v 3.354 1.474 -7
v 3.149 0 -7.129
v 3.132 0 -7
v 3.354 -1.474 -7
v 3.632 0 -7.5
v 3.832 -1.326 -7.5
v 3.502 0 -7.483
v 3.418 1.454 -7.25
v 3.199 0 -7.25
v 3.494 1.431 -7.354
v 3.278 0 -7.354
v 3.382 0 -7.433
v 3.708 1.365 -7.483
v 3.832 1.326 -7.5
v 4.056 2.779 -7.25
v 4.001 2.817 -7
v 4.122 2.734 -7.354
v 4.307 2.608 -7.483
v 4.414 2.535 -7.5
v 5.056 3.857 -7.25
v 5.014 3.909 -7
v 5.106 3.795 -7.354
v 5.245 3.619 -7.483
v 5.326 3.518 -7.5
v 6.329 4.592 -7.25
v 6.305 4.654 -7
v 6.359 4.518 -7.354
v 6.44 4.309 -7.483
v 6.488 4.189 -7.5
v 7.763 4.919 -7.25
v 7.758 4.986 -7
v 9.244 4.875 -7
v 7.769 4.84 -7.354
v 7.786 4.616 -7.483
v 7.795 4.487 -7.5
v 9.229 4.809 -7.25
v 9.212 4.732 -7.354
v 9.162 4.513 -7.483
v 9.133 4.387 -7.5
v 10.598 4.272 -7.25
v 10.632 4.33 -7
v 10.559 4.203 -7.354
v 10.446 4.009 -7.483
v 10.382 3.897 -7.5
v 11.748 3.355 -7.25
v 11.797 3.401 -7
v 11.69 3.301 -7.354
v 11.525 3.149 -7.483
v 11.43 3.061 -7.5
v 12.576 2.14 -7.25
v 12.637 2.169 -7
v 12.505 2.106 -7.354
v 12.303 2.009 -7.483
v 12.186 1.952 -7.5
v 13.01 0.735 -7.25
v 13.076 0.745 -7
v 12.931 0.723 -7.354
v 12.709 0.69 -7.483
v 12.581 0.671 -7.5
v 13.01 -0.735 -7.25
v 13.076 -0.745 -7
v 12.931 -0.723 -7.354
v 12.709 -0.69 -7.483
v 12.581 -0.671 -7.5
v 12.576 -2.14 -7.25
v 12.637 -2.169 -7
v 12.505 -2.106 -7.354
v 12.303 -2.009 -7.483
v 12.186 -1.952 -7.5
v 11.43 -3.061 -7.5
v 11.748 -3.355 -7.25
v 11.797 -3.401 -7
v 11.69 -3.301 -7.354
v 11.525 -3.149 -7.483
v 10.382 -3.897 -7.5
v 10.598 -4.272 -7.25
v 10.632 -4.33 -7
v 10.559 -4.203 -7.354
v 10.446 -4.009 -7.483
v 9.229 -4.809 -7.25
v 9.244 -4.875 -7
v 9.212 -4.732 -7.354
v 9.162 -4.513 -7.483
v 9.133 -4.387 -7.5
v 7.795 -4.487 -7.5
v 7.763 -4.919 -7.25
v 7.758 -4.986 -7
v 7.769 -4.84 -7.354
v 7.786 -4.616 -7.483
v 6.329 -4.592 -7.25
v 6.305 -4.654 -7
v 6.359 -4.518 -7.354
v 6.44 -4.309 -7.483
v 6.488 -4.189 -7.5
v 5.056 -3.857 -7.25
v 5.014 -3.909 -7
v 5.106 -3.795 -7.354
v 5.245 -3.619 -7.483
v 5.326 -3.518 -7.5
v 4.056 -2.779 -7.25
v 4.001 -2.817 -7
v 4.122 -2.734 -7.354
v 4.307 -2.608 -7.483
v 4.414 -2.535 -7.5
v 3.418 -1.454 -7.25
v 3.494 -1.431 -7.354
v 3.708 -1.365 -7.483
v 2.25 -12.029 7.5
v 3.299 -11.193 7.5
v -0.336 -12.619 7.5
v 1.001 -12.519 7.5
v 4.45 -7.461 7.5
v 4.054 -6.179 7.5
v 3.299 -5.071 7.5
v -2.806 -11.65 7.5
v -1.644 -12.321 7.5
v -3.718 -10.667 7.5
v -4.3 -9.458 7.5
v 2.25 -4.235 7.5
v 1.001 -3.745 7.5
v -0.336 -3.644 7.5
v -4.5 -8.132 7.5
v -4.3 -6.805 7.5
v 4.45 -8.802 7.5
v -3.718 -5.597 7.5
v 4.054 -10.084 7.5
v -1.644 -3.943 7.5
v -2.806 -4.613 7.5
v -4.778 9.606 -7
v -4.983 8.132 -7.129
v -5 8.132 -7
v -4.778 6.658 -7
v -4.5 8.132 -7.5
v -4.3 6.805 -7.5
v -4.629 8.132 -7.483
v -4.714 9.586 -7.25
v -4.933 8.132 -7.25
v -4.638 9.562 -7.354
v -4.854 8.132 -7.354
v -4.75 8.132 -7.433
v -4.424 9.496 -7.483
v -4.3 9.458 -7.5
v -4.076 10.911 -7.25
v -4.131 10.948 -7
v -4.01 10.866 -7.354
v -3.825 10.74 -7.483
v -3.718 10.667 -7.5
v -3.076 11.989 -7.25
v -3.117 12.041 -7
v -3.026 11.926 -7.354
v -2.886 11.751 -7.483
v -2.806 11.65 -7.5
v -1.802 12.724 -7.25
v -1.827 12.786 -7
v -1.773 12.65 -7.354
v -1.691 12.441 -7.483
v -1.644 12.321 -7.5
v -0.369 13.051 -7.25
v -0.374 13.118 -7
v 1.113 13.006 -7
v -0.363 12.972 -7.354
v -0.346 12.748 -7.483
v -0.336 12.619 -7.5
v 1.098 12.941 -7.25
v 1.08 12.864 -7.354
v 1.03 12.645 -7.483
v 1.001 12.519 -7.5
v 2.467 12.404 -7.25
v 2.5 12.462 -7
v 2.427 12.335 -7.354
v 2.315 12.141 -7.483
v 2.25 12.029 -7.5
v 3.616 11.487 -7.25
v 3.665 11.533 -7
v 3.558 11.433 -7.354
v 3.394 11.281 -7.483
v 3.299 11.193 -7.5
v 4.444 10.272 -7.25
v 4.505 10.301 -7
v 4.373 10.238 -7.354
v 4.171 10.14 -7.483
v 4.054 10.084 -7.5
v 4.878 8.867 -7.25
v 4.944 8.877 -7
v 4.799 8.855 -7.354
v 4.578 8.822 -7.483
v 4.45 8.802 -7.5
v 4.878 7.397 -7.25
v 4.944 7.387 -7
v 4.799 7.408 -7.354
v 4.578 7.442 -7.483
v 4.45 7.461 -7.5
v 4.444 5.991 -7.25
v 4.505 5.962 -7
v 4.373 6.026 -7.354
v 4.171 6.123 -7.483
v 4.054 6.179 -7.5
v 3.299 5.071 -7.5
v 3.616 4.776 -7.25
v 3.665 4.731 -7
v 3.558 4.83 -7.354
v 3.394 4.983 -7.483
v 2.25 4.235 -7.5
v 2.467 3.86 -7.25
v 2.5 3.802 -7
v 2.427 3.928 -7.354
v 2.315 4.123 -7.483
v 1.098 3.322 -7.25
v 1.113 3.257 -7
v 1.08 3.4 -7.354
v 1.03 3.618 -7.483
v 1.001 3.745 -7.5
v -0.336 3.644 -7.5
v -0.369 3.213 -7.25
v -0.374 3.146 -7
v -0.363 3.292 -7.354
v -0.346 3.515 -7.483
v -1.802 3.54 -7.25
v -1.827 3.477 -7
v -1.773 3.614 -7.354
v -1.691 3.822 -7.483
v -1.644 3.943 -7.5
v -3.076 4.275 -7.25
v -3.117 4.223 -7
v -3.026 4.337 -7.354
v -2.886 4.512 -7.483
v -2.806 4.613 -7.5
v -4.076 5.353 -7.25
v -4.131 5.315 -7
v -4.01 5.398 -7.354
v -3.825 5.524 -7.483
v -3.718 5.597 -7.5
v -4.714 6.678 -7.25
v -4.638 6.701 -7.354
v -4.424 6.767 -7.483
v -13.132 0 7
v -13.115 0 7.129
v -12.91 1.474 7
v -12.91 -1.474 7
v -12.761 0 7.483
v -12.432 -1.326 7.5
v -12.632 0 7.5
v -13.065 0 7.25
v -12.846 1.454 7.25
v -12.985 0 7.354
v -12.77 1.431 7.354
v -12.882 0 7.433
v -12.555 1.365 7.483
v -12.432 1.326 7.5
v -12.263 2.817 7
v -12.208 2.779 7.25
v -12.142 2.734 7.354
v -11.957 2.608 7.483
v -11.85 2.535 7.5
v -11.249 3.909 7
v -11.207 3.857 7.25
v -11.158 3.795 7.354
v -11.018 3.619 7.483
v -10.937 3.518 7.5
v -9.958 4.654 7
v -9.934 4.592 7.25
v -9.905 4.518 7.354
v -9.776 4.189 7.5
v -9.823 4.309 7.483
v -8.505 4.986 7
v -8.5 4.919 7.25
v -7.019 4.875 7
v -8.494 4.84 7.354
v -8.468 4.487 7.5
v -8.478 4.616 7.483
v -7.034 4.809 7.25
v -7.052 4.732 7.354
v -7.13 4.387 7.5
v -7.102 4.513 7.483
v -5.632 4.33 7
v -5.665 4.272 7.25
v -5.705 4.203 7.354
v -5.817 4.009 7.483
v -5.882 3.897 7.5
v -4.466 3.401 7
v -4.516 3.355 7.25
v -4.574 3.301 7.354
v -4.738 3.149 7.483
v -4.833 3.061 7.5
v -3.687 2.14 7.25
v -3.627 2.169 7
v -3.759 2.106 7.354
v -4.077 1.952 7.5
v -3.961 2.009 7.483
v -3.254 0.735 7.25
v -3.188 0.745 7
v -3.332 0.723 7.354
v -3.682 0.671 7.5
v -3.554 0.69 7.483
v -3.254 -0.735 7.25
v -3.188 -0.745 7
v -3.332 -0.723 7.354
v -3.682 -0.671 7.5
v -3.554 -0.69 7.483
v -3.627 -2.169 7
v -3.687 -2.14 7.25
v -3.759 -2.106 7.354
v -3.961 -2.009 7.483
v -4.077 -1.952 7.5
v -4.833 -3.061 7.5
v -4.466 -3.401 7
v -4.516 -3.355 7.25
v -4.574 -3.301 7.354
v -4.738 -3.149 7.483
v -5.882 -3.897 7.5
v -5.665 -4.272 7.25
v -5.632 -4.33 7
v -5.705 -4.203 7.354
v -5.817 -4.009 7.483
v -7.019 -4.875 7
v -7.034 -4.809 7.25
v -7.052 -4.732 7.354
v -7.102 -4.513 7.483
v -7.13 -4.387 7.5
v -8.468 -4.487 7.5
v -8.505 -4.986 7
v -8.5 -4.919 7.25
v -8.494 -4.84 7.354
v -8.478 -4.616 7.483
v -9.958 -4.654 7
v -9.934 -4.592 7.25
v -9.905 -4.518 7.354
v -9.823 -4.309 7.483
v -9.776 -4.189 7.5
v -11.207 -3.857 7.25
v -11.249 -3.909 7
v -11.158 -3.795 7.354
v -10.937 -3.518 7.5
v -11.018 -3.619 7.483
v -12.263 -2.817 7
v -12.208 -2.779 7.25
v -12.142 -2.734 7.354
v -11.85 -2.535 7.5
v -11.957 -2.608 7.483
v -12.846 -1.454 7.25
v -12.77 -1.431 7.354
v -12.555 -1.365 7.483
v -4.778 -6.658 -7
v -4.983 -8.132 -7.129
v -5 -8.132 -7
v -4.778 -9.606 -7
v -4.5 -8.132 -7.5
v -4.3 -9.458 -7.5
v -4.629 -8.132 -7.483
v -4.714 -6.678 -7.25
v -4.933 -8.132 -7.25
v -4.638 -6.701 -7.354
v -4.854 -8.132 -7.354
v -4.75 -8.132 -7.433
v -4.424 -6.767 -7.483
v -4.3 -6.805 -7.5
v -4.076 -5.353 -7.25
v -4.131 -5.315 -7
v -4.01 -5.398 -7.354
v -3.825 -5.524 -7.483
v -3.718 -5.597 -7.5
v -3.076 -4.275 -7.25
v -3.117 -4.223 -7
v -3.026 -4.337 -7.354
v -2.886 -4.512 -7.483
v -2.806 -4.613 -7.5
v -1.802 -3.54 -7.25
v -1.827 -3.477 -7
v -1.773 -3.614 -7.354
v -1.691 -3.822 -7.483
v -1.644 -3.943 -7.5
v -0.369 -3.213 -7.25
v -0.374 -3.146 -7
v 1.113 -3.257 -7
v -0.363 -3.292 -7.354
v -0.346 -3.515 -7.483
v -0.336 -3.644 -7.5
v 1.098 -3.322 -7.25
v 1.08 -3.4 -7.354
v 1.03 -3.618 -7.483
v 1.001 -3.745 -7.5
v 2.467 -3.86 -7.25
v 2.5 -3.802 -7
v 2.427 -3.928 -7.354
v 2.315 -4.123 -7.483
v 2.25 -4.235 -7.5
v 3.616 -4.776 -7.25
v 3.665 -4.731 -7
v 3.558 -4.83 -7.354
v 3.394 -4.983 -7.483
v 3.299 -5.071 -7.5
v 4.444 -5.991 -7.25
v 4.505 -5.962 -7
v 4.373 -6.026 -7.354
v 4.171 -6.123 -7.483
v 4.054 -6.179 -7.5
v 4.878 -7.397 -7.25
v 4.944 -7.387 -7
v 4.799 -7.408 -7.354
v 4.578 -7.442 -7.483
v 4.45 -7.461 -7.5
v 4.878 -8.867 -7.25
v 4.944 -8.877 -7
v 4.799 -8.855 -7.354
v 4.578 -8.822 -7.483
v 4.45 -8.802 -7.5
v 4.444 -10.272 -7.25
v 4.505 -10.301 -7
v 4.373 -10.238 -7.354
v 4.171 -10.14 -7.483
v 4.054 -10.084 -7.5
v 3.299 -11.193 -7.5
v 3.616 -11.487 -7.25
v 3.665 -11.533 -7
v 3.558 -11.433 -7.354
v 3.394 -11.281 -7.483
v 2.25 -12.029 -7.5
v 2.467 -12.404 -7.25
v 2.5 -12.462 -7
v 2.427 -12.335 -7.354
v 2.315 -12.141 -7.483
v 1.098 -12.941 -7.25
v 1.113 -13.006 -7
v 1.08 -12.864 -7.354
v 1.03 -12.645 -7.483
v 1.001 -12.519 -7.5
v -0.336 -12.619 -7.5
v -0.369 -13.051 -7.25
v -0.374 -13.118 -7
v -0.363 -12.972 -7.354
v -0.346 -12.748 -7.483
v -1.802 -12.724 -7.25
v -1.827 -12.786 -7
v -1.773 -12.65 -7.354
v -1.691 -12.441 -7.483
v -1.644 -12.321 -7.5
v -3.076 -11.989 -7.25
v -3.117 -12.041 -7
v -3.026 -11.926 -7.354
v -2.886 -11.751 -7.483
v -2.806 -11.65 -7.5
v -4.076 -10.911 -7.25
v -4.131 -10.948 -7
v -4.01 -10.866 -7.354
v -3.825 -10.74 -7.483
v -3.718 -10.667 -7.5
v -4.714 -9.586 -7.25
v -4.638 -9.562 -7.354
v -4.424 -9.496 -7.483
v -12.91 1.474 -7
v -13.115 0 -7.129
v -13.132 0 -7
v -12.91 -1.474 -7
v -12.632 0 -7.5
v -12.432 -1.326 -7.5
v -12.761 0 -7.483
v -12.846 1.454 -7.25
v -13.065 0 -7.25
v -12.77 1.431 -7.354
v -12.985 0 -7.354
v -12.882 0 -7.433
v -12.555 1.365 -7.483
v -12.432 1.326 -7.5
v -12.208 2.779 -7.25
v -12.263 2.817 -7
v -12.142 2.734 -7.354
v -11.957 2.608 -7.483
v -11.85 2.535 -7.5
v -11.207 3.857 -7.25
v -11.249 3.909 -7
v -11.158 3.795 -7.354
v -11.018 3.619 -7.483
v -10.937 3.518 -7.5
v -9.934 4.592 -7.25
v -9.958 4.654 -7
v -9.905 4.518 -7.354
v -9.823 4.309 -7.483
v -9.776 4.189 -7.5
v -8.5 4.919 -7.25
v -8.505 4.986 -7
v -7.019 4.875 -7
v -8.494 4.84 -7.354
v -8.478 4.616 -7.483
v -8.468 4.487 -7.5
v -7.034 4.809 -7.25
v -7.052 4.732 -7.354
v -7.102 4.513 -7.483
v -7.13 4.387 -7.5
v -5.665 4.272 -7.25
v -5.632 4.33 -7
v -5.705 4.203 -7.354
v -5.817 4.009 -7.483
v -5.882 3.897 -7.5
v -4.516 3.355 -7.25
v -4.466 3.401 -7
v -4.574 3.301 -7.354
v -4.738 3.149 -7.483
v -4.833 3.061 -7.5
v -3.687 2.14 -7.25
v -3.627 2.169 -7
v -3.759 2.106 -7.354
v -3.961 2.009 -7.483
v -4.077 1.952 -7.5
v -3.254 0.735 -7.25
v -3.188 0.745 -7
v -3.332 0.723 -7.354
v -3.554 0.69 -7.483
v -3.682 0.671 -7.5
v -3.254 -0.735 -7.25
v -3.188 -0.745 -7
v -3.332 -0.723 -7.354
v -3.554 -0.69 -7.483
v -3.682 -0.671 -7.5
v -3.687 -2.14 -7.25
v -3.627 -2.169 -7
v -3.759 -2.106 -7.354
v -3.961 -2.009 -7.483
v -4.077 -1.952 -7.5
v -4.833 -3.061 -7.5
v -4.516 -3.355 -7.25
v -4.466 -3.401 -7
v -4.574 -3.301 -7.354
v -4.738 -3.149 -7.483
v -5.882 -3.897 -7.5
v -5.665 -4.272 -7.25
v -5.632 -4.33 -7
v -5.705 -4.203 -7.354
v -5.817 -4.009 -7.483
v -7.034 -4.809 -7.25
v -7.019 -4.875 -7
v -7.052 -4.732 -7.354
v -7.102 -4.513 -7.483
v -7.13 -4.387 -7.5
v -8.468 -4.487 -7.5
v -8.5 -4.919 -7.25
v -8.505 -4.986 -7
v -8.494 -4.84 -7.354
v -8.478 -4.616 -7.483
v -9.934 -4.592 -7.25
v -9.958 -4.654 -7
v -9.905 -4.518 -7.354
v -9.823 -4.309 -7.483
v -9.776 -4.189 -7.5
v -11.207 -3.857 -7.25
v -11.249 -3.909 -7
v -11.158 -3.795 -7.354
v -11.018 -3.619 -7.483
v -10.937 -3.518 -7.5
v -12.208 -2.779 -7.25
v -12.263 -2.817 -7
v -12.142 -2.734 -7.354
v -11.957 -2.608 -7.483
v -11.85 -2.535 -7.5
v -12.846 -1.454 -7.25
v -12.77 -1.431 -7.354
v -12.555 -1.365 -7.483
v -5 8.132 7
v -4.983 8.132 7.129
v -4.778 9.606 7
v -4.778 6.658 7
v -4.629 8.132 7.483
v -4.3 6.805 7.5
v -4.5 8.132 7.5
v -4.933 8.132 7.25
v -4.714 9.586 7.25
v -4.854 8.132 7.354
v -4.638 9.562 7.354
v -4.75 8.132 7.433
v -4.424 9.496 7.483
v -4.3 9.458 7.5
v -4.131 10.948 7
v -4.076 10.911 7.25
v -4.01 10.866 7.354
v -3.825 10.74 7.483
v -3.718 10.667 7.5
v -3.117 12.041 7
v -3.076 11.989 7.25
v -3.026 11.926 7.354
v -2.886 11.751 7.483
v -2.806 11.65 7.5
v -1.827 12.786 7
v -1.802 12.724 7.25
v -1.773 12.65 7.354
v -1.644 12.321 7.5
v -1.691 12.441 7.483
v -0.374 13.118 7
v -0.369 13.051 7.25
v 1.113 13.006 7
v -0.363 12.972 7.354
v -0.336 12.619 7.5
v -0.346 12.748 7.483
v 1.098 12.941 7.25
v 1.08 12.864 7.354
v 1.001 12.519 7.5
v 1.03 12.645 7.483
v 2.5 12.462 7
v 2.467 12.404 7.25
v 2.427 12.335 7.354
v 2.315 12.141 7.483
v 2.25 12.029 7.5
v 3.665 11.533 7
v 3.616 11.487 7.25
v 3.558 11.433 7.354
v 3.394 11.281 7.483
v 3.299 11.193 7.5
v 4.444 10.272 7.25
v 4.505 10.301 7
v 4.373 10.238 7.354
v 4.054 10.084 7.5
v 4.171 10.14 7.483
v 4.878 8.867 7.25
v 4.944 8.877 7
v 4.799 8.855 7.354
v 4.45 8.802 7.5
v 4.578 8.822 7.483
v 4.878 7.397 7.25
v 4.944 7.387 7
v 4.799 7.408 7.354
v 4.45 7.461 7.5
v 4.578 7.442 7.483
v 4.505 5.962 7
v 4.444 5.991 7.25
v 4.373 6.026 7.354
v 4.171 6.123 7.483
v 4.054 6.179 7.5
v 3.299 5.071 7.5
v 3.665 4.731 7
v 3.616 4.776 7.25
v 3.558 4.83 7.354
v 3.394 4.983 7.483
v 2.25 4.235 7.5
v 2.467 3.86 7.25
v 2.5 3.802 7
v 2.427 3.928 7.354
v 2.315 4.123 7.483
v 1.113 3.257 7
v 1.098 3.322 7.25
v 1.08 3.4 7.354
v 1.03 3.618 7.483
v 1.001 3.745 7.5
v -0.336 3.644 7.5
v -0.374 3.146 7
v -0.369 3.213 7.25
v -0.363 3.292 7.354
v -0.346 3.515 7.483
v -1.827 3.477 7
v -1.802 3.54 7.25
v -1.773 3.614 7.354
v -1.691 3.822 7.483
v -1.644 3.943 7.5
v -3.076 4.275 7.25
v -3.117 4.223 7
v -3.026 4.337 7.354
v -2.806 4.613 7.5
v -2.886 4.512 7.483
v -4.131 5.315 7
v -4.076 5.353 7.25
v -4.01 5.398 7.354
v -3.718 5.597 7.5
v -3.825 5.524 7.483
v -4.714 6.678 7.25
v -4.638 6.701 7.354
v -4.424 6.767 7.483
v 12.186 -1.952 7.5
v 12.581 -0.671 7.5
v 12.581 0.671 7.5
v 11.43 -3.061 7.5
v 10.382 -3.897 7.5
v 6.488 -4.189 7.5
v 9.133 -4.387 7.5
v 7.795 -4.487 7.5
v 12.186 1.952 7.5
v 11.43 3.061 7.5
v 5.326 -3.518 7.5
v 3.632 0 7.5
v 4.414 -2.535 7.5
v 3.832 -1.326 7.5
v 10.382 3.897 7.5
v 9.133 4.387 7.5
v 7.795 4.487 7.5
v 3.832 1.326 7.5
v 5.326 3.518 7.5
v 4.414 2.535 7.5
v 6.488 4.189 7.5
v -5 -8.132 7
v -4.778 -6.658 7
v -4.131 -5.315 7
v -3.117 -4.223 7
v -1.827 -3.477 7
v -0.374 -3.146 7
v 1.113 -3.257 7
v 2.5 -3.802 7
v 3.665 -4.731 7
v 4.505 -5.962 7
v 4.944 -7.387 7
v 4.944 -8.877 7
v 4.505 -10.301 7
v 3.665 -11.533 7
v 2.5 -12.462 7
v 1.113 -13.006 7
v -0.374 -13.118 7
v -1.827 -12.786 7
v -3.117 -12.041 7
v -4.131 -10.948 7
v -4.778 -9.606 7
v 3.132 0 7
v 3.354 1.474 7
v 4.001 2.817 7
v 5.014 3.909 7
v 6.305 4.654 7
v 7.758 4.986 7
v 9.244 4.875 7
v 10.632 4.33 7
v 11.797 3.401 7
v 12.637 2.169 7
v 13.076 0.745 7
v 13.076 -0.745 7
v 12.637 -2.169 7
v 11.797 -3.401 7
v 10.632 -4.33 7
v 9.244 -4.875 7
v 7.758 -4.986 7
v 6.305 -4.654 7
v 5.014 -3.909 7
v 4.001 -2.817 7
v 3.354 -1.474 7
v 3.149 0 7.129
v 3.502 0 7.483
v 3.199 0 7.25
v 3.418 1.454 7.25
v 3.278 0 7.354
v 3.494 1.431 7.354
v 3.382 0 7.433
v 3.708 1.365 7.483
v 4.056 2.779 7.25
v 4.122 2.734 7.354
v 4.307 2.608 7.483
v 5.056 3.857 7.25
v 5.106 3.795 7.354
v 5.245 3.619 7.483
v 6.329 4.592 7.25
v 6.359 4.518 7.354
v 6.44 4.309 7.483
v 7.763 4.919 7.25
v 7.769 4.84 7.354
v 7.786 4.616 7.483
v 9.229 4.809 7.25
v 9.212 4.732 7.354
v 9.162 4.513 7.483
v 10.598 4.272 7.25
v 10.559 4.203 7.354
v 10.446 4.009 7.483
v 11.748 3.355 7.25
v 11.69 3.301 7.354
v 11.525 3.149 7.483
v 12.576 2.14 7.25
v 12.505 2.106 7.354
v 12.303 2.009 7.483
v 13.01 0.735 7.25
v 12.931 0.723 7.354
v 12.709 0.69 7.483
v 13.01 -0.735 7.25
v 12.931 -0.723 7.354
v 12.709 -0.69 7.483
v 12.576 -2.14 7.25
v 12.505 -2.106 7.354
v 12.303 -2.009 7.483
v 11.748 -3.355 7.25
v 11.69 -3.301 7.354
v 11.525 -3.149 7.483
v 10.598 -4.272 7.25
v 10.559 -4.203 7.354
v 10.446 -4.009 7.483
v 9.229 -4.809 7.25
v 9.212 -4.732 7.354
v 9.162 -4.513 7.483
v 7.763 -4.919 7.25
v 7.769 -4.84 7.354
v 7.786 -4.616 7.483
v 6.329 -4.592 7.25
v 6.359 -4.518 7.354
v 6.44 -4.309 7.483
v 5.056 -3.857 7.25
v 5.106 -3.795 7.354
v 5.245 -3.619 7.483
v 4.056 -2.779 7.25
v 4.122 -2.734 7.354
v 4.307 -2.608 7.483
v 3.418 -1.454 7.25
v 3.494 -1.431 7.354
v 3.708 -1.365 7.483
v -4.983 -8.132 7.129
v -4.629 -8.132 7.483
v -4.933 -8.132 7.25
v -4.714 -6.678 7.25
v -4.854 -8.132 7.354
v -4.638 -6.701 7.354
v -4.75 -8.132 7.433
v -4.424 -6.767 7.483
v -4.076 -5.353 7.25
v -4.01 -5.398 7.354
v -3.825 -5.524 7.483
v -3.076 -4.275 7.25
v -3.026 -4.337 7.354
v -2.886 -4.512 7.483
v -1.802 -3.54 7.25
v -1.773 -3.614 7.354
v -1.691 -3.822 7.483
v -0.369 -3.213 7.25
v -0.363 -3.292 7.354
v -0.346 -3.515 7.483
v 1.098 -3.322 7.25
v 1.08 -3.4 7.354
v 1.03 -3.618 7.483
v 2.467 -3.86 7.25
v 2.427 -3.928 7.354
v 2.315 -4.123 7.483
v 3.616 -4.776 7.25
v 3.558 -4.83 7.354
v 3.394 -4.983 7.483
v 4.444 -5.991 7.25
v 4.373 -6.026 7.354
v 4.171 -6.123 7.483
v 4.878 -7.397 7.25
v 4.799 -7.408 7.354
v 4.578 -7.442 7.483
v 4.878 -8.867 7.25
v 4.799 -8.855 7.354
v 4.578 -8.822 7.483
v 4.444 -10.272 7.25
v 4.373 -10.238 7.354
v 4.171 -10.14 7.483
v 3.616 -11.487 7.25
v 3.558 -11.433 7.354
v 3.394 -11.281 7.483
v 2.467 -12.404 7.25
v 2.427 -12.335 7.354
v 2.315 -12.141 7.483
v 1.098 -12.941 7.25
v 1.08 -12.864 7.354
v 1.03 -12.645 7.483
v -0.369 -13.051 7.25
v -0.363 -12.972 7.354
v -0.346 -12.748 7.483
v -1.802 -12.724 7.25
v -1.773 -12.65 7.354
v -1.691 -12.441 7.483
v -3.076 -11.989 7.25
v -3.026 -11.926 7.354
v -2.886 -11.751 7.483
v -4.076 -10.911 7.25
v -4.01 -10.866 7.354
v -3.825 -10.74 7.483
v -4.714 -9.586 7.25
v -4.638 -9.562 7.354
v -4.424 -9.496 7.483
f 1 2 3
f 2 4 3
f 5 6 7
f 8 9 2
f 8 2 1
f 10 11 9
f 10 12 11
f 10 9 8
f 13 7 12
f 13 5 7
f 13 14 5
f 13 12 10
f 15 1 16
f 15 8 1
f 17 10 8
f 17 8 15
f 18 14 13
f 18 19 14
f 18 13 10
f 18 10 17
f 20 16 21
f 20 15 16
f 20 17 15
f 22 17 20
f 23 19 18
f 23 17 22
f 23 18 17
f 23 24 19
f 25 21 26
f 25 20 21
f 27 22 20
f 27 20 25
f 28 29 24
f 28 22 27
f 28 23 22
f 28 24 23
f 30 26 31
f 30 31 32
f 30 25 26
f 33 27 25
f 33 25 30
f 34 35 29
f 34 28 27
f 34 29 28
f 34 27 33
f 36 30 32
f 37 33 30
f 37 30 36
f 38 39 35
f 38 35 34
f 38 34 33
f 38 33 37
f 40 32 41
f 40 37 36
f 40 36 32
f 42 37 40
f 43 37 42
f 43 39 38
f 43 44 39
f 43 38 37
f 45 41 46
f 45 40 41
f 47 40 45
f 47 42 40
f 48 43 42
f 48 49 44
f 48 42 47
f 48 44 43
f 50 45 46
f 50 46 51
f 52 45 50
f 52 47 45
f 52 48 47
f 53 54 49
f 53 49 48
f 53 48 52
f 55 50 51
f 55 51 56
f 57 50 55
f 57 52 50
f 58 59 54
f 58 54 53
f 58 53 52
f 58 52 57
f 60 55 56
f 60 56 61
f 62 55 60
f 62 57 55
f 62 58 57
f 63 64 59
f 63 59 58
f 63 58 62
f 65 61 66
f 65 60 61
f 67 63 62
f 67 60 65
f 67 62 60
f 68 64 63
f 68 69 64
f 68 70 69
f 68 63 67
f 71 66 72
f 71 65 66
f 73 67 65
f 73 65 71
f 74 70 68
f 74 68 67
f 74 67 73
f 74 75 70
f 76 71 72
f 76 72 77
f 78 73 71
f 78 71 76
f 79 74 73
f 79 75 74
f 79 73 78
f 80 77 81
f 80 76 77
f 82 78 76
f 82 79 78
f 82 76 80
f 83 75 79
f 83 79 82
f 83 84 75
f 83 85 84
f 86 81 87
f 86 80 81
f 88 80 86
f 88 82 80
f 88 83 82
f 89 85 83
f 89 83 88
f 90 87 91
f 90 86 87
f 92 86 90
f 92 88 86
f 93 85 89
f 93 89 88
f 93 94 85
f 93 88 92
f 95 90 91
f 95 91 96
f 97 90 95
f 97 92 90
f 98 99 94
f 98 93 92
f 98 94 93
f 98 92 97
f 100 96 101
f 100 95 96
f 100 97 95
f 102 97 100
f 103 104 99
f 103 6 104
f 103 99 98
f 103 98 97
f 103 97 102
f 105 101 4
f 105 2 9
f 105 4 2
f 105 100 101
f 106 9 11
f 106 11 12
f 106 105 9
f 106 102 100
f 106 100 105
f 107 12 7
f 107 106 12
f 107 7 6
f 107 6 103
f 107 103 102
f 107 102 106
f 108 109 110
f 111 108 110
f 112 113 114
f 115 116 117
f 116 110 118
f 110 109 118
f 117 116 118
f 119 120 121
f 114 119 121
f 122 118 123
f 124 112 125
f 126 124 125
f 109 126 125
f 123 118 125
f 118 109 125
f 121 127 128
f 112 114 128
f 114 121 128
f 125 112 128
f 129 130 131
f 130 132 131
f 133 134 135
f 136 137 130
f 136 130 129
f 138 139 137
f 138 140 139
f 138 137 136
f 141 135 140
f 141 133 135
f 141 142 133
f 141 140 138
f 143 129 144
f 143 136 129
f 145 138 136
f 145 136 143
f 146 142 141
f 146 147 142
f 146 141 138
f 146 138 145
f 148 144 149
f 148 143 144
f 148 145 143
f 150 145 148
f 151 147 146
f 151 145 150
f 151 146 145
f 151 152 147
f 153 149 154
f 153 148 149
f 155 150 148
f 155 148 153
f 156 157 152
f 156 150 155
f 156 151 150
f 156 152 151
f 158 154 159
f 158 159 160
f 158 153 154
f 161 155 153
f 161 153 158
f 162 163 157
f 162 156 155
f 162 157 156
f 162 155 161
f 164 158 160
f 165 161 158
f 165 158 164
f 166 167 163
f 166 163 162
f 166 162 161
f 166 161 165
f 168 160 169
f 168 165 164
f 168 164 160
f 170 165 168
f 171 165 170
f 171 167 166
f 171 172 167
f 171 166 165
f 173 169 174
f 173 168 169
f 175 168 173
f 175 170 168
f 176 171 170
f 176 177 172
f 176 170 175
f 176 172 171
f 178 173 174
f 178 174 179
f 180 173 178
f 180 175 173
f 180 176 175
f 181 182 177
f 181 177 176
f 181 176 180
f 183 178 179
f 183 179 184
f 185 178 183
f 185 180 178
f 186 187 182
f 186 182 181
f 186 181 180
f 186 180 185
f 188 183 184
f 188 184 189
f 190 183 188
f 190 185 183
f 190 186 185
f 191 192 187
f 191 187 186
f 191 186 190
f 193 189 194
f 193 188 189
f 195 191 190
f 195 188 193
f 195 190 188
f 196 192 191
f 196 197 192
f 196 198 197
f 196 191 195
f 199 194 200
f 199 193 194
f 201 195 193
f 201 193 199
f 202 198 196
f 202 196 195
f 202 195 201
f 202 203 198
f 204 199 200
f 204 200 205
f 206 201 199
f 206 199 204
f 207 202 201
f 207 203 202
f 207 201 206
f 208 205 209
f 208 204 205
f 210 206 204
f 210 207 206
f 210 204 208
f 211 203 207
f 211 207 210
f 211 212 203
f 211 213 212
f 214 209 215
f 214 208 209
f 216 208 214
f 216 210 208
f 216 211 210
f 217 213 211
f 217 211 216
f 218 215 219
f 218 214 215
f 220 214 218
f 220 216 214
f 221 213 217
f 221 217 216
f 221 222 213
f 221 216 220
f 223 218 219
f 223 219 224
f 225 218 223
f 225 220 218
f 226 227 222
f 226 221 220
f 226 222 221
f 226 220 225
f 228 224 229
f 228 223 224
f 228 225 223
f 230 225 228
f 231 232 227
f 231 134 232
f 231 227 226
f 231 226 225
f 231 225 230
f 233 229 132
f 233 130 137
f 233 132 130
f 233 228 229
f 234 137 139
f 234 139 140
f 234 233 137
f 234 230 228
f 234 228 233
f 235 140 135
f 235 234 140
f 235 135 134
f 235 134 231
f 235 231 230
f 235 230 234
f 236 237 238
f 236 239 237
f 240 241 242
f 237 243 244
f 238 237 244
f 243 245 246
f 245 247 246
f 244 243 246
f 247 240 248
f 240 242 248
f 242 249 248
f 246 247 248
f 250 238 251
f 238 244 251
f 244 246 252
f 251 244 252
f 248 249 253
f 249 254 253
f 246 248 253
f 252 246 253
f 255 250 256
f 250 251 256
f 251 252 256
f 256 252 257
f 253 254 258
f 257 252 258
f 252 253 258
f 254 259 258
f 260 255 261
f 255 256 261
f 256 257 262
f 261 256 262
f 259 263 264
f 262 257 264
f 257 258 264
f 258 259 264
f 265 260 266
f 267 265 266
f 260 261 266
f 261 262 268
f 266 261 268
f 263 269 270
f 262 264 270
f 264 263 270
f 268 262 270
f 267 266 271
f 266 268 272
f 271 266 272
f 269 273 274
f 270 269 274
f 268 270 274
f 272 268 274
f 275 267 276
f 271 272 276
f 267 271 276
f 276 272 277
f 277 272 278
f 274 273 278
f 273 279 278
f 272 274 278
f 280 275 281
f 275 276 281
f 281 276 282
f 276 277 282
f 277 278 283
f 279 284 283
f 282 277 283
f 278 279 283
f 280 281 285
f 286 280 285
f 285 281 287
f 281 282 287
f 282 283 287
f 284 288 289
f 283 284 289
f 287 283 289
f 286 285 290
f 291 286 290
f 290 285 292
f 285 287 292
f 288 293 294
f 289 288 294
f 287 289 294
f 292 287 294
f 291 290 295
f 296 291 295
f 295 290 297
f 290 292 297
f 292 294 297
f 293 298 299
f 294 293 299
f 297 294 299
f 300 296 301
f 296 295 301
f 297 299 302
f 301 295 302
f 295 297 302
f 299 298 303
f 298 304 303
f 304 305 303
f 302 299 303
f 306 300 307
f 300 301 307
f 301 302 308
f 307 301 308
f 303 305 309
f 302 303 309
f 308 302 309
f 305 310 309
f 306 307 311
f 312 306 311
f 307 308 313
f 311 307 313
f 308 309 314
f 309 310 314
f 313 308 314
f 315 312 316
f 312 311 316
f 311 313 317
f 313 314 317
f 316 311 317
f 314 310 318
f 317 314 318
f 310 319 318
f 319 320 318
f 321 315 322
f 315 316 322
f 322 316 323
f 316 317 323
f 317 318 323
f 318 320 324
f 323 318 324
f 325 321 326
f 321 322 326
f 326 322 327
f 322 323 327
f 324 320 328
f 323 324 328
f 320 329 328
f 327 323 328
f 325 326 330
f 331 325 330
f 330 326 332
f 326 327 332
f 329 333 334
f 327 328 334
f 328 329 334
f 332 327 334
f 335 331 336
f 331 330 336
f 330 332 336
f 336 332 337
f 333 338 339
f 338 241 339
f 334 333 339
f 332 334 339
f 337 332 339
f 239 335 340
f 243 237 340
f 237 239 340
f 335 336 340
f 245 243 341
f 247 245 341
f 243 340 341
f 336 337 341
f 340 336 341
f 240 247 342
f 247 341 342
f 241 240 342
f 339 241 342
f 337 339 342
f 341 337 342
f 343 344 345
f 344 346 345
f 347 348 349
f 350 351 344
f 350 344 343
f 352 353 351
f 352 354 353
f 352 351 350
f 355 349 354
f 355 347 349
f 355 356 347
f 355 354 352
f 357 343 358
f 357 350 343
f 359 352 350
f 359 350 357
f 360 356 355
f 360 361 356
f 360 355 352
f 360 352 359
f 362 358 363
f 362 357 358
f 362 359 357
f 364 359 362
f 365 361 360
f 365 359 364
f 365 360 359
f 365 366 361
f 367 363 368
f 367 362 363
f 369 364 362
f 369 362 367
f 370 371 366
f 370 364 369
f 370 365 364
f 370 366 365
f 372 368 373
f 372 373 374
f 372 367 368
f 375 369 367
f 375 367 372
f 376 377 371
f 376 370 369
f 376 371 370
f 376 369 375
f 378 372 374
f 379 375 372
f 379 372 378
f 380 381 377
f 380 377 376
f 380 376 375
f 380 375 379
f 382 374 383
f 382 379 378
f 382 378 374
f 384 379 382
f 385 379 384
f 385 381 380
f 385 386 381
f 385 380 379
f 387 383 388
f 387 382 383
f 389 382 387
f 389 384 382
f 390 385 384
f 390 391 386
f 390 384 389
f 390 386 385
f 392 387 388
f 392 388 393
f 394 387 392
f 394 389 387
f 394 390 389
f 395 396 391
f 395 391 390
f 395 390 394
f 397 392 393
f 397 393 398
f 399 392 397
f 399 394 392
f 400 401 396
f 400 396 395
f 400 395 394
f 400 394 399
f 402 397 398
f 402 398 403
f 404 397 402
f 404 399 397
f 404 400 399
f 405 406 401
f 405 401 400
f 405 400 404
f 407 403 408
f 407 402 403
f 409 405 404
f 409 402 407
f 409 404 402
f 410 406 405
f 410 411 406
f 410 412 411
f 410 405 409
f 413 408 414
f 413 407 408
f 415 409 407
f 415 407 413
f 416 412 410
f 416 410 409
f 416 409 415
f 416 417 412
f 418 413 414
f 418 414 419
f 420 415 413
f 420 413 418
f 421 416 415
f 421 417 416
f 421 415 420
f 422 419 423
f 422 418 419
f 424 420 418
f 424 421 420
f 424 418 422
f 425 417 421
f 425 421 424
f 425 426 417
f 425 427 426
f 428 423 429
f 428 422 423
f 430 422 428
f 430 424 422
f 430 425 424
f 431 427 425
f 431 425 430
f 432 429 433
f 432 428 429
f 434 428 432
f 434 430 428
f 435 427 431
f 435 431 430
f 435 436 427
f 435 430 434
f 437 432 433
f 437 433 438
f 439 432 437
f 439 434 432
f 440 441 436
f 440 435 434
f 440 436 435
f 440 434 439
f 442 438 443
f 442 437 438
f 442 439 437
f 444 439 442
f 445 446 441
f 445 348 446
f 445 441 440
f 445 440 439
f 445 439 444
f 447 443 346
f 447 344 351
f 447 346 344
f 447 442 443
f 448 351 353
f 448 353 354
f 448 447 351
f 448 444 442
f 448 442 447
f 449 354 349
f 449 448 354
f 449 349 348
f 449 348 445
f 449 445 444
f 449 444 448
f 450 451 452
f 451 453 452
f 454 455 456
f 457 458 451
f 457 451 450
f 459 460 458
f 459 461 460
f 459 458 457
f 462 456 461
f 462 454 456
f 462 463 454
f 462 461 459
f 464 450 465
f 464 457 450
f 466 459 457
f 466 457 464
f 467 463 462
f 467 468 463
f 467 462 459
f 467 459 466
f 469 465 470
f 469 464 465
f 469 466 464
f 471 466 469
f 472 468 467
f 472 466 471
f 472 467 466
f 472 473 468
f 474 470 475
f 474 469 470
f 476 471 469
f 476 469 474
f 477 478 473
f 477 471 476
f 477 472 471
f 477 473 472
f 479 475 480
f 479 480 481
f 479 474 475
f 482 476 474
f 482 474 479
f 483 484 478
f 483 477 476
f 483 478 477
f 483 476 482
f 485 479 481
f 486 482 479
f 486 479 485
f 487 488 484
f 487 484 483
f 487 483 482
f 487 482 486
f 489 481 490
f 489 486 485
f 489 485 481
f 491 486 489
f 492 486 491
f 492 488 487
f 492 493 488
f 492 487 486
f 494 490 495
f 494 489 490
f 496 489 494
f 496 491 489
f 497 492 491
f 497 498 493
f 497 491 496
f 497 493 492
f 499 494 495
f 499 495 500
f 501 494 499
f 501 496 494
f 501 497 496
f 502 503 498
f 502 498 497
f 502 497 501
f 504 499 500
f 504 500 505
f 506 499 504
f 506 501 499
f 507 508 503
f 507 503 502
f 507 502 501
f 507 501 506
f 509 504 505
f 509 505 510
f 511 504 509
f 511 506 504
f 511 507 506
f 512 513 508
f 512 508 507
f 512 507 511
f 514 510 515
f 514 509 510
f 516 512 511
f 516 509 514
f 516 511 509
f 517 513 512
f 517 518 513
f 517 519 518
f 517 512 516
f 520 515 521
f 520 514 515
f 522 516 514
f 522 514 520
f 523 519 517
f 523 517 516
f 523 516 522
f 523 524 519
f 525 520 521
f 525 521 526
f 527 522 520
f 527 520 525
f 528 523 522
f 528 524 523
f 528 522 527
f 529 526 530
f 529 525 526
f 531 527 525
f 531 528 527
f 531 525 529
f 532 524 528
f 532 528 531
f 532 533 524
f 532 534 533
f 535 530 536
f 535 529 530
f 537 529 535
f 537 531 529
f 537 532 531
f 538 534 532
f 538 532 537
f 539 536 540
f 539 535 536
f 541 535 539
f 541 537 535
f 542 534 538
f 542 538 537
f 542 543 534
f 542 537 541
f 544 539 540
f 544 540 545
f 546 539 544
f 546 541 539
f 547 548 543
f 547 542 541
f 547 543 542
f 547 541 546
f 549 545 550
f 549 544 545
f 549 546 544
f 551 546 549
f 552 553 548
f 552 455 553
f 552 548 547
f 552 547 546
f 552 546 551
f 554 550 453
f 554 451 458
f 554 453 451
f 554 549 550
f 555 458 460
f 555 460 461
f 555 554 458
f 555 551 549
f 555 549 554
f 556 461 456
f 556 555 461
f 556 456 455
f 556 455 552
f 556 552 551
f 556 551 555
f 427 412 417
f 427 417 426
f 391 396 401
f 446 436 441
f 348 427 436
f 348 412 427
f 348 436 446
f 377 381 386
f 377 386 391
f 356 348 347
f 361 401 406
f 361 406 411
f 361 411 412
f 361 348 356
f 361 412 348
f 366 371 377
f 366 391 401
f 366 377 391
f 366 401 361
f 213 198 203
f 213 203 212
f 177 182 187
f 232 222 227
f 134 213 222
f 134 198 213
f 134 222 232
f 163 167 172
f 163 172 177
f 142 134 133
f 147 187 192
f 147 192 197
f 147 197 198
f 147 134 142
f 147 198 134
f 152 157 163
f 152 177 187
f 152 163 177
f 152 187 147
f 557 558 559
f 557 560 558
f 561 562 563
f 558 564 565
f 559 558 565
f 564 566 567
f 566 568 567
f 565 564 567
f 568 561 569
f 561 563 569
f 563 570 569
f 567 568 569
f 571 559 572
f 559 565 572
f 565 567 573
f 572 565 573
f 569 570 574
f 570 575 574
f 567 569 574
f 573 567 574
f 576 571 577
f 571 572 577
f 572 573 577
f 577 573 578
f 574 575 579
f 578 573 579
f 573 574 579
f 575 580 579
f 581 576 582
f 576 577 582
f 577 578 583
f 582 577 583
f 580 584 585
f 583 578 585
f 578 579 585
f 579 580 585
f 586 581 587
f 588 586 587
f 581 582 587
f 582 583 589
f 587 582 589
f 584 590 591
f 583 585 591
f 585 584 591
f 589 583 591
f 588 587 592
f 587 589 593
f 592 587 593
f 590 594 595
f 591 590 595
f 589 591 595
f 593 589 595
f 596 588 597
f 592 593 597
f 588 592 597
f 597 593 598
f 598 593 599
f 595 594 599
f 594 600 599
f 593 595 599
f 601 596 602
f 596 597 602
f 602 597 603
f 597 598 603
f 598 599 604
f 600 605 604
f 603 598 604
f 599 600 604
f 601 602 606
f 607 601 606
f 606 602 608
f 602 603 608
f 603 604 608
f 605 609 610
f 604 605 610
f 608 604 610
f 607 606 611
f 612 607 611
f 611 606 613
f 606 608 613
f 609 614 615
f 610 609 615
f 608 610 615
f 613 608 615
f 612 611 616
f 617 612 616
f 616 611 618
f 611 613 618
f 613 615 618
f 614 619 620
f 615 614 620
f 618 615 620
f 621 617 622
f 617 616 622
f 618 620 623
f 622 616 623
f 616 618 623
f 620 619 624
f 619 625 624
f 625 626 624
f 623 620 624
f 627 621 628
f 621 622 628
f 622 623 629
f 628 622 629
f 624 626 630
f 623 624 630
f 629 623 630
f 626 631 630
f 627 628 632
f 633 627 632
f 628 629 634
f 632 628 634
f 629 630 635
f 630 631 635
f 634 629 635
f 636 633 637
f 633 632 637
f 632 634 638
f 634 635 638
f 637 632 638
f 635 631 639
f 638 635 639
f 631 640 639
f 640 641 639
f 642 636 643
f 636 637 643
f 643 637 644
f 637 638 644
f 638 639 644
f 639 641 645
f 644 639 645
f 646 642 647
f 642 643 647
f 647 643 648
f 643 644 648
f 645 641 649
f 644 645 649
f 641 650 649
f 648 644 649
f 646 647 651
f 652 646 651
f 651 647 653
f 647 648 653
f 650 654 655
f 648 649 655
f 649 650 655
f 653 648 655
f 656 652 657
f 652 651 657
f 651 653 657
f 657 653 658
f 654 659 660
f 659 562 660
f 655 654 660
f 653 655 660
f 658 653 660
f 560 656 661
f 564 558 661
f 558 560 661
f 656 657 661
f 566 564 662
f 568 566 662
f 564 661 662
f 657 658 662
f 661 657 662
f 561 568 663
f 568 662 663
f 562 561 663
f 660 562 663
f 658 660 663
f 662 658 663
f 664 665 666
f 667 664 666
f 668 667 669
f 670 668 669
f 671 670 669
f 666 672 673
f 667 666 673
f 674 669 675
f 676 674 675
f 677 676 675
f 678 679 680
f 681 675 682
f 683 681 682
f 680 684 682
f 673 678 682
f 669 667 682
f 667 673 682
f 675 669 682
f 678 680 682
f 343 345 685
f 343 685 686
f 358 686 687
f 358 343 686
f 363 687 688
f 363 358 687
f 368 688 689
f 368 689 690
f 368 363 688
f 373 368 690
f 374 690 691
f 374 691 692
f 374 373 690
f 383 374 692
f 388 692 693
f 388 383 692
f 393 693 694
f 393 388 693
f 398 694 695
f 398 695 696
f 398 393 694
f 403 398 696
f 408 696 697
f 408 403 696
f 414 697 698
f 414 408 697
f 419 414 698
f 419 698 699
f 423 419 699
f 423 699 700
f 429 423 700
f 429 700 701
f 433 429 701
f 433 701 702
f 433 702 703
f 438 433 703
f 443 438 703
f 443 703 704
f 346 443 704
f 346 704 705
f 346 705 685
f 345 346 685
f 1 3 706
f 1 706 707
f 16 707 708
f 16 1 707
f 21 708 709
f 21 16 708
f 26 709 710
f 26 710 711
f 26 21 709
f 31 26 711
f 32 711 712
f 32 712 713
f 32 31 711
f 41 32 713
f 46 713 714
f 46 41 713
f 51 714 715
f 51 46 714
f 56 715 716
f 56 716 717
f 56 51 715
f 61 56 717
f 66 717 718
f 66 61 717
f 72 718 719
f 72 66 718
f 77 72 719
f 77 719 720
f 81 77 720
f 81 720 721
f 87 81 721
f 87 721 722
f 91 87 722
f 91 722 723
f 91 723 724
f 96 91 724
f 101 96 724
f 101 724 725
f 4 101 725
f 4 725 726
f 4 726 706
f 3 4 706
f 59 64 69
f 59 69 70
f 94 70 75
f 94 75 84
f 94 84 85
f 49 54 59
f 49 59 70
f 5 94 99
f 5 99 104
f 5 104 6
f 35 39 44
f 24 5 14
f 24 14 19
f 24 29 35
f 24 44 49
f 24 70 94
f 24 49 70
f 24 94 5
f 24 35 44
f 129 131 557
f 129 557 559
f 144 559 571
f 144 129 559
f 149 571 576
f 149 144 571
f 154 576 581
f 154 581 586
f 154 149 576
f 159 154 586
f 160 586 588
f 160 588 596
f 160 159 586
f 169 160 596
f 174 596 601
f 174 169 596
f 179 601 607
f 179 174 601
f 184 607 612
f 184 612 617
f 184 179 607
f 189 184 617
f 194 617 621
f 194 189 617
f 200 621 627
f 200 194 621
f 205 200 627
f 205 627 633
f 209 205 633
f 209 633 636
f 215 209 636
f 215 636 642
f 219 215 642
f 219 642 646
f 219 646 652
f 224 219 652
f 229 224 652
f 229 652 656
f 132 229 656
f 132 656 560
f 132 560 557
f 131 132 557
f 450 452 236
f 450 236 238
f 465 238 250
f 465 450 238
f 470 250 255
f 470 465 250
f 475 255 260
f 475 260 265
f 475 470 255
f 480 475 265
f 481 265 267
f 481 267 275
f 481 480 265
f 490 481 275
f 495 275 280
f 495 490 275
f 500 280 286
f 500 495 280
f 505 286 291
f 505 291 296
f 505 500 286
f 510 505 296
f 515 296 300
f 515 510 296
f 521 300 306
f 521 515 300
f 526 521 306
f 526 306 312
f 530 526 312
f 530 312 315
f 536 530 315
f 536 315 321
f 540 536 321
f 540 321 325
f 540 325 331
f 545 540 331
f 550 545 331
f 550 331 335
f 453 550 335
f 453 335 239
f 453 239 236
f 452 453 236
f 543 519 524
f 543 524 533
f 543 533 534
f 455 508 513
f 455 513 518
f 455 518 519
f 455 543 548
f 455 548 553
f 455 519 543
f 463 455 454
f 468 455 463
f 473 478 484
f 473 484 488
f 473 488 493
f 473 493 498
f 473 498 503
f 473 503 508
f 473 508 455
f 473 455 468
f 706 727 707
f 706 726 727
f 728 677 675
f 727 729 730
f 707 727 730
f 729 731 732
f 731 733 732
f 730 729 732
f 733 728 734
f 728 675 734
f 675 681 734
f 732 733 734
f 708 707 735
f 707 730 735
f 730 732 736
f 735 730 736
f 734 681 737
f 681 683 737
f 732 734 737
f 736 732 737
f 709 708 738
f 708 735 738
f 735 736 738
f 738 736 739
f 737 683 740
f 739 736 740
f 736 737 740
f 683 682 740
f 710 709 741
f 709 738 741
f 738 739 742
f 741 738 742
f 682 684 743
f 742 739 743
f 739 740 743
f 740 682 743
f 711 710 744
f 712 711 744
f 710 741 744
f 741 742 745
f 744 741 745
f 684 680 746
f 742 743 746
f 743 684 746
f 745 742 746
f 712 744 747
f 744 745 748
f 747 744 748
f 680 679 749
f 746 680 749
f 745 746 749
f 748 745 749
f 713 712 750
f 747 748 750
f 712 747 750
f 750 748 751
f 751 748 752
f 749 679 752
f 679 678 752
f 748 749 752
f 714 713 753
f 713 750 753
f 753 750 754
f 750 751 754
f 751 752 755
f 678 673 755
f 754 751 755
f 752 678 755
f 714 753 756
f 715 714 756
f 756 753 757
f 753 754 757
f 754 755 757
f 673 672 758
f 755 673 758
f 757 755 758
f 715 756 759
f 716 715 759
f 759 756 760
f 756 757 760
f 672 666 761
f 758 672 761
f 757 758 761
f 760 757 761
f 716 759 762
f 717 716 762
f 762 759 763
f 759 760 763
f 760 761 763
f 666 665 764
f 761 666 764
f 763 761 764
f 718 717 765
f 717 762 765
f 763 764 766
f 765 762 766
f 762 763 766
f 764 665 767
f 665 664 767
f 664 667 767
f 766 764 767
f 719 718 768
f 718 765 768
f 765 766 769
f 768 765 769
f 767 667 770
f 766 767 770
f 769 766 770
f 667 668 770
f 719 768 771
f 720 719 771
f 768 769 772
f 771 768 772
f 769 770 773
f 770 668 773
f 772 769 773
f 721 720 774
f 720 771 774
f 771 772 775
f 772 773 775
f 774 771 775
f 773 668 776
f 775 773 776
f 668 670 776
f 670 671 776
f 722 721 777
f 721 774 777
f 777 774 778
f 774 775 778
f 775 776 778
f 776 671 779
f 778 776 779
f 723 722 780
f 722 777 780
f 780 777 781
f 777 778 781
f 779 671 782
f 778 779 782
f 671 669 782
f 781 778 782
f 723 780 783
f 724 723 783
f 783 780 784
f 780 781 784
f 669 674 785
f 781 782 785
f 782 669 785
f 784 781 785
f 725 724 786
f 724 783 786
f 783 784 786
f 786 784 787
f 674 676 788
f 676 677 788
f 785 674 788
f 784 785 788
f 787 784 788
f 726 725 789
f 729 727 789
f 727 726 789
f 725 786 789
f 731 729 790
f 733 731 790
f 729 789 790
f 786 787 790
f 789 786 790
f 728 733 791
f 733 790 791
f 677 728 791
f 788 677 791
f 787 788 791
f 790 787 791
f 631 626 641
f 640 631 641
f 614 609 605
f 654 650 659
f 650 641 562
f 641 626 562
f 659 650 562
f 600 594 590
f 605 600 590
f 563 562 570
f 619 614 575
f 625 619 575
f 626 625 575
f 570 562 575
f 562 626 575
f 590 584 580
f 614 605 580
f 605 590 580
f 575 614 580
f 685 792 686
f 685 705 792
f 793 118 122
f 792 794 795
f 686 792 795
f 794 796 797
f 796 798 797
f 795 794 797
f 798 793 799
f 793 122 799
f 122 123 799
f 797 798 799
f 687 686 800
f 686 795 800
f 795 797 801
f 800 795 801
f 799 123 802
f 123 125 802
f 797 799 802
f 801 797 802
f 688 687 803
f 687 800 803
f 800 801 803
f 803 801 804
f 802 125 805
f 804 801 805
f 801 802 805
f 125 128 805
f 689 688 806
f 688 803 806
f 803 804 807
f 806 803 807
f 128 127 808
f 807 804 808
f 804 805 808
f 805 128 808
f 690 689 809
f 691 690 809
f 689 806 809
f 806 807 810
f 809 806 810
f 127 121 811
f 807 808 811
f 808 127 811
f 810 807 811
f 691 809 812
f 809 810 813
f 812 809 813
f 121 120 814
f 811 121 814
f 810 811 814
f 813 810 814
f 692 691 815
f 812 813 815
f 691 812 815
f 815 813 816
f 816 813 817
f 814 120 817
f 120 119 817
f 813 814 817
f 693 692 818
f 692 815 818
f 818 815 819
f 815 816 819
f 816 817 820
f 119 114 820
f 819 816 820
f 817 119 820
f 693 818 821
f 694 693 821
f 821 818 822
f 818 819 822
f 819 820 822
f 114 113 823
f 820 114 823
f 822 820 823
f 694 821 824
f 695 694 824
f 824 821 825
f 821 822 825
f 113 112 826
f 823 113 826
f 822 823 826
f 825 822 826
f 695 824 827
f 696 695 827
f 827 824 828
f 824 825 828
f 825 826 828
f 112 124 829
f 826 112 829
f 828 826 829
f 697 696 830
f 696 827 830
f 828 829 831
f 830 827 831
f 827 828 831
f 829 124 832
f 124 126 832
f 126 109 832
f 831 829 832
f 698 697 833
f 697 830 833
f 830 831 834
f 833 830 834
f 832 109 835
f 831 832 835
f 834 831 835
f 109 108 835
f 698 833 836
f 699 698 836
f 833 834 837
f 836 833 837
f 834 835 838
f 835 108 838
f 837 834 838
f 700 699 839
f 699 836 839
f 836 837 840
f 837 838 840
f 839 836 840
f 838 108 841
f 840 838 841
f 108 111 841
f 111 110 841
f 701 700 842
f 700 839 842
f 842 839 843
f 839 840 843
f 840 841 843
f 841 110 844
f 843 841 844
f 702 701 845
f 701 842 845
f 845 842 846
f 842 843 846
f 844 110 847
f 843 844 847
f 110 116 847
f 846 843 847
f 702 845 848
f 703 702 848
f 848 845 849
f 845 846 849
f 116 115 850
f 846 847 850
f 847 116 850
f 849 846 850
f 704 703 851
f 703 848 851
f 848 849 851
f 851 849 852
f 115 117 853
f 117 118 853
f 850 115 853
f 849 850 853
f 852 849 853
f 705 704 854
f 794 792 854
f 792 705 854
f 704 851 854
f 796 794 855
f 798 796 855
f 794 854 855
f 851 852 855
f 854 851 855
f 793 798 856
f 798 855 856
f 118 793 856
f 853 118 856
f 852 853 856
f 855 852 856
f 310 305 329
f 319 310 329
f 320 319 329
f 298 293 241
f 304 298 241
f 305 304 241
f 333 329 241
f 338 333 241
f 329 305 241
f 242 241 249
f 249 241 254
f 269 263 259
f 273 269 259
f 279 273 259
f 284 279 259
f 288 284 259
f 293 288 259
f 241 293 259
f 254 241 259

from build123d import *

# Parameters (mm, degrees)
SKETCH_1_R        = 5
EXTRUDE_1_DEPTH   = 7.5
EXTRUDE_1_2_DEPTH = 7.5
EXTRUDE_1_3_DEPTH = 7.5
EXTRUDE_1_4_DEPTH = 7.5
FILLET_1_R        = 0.5
FILLET_2_R        = 0.5
FILLET_3_R        = 0.5
FILLET_4_R        = 0.5


with BuildPart() as part:
    # 草图1 → 凸台-拉伸1 (new, symmetric)
    with BuildSketch(Plane(origin=(-51, 0, 0), x_dir=(-1, 0, 0), z_dir=(0, 0, -1))):
        with Locations((-42.868272016, 0)):
            Circle(SKETCH_1_R)
    extrude(amount=EXTRUDE_1_DEPTH, both=True)

    # 圆角4
    fillet_4_edges = [part.edges().sort_by_distance(p)[0] for p in [
        (-3.131727984, 0, 7.5),
        (-3.131727984, 0, -7.5),
    ]]
    fillet(fillet_4_edges, radius=FILLET_4_R)


with BuildPart() as body_2:
    # 草图1 → Extrude 1 2 (new, symmetric)
    with BuildSketch(Plane(origin=(-51, 0, 0), x_dir=(-1, 0, 0), z_dir=(0, 0, -1))):
        with Locations((-51, -8.131727984)):
            Circle(SKETCH_1_R)
    extrude(amount=EXTRUDE_1_2_DEPTH, both=True)

    # 圆角2
    fillet_2_edges = [body_2.edges().sort_by_distance(p)[0] for p in [
        (5, -8.131727984, 7.5),
        (5, -8.131727984, -7.5),
    ]]
    fillet(fillet_2_edges, radius=FILLET_2_R)


with BuildPart() as body_3:
    # 草图1 → Extrude 1 3 (new, symmetric)
    with BuildSketch(Plane(origin=(-51, 0, 0), x_dir=(-1, 0, 0), z_dir=(0, 0, -1))):
        with Locations((-51, 8.131727984)):
            Circle(SKETCH_1_R)
    extrude(amount=EXTRUDE_1_3_DEPTH, both=True)

    # 圆角3
    fillet_3_edges = [body_3.edges().sort_by_distance(p)[0] for p in [
        (5, 8.131727984, 7.5),
        (5, 8.131727984, -7.5),
    ]]
    fillet(fillet_3_edges, radius=FILLET_3_R)


with BuildPart() as body_4:
    # 草图1 → Extrude 1 4 (new, symmetric)
    with BuildSketch(Plane(origin=(-51, 0, 0), x_dir=(-1, 0, 0), z_dir=(0, 0, -1))):
        with Locations((-59.131727984, 0)):
            Circle(SKETCH_1_R)
    extrude(amount=EXTRUDE_1_4_DEPTH, both=True)

    # 圆角1
    fillet_1_edges = [body_4.edges().sort_by_distance(p)[0] for p in [
        (13.131727984, 0, 7.5),
        (13.131727984, 0, -7.5),
    ]]
    fillet(fillet_1_edges, radius=FILLET_1_R)


solid = Compound([part.part, body_2.part, body_3.part, body_4.part])
